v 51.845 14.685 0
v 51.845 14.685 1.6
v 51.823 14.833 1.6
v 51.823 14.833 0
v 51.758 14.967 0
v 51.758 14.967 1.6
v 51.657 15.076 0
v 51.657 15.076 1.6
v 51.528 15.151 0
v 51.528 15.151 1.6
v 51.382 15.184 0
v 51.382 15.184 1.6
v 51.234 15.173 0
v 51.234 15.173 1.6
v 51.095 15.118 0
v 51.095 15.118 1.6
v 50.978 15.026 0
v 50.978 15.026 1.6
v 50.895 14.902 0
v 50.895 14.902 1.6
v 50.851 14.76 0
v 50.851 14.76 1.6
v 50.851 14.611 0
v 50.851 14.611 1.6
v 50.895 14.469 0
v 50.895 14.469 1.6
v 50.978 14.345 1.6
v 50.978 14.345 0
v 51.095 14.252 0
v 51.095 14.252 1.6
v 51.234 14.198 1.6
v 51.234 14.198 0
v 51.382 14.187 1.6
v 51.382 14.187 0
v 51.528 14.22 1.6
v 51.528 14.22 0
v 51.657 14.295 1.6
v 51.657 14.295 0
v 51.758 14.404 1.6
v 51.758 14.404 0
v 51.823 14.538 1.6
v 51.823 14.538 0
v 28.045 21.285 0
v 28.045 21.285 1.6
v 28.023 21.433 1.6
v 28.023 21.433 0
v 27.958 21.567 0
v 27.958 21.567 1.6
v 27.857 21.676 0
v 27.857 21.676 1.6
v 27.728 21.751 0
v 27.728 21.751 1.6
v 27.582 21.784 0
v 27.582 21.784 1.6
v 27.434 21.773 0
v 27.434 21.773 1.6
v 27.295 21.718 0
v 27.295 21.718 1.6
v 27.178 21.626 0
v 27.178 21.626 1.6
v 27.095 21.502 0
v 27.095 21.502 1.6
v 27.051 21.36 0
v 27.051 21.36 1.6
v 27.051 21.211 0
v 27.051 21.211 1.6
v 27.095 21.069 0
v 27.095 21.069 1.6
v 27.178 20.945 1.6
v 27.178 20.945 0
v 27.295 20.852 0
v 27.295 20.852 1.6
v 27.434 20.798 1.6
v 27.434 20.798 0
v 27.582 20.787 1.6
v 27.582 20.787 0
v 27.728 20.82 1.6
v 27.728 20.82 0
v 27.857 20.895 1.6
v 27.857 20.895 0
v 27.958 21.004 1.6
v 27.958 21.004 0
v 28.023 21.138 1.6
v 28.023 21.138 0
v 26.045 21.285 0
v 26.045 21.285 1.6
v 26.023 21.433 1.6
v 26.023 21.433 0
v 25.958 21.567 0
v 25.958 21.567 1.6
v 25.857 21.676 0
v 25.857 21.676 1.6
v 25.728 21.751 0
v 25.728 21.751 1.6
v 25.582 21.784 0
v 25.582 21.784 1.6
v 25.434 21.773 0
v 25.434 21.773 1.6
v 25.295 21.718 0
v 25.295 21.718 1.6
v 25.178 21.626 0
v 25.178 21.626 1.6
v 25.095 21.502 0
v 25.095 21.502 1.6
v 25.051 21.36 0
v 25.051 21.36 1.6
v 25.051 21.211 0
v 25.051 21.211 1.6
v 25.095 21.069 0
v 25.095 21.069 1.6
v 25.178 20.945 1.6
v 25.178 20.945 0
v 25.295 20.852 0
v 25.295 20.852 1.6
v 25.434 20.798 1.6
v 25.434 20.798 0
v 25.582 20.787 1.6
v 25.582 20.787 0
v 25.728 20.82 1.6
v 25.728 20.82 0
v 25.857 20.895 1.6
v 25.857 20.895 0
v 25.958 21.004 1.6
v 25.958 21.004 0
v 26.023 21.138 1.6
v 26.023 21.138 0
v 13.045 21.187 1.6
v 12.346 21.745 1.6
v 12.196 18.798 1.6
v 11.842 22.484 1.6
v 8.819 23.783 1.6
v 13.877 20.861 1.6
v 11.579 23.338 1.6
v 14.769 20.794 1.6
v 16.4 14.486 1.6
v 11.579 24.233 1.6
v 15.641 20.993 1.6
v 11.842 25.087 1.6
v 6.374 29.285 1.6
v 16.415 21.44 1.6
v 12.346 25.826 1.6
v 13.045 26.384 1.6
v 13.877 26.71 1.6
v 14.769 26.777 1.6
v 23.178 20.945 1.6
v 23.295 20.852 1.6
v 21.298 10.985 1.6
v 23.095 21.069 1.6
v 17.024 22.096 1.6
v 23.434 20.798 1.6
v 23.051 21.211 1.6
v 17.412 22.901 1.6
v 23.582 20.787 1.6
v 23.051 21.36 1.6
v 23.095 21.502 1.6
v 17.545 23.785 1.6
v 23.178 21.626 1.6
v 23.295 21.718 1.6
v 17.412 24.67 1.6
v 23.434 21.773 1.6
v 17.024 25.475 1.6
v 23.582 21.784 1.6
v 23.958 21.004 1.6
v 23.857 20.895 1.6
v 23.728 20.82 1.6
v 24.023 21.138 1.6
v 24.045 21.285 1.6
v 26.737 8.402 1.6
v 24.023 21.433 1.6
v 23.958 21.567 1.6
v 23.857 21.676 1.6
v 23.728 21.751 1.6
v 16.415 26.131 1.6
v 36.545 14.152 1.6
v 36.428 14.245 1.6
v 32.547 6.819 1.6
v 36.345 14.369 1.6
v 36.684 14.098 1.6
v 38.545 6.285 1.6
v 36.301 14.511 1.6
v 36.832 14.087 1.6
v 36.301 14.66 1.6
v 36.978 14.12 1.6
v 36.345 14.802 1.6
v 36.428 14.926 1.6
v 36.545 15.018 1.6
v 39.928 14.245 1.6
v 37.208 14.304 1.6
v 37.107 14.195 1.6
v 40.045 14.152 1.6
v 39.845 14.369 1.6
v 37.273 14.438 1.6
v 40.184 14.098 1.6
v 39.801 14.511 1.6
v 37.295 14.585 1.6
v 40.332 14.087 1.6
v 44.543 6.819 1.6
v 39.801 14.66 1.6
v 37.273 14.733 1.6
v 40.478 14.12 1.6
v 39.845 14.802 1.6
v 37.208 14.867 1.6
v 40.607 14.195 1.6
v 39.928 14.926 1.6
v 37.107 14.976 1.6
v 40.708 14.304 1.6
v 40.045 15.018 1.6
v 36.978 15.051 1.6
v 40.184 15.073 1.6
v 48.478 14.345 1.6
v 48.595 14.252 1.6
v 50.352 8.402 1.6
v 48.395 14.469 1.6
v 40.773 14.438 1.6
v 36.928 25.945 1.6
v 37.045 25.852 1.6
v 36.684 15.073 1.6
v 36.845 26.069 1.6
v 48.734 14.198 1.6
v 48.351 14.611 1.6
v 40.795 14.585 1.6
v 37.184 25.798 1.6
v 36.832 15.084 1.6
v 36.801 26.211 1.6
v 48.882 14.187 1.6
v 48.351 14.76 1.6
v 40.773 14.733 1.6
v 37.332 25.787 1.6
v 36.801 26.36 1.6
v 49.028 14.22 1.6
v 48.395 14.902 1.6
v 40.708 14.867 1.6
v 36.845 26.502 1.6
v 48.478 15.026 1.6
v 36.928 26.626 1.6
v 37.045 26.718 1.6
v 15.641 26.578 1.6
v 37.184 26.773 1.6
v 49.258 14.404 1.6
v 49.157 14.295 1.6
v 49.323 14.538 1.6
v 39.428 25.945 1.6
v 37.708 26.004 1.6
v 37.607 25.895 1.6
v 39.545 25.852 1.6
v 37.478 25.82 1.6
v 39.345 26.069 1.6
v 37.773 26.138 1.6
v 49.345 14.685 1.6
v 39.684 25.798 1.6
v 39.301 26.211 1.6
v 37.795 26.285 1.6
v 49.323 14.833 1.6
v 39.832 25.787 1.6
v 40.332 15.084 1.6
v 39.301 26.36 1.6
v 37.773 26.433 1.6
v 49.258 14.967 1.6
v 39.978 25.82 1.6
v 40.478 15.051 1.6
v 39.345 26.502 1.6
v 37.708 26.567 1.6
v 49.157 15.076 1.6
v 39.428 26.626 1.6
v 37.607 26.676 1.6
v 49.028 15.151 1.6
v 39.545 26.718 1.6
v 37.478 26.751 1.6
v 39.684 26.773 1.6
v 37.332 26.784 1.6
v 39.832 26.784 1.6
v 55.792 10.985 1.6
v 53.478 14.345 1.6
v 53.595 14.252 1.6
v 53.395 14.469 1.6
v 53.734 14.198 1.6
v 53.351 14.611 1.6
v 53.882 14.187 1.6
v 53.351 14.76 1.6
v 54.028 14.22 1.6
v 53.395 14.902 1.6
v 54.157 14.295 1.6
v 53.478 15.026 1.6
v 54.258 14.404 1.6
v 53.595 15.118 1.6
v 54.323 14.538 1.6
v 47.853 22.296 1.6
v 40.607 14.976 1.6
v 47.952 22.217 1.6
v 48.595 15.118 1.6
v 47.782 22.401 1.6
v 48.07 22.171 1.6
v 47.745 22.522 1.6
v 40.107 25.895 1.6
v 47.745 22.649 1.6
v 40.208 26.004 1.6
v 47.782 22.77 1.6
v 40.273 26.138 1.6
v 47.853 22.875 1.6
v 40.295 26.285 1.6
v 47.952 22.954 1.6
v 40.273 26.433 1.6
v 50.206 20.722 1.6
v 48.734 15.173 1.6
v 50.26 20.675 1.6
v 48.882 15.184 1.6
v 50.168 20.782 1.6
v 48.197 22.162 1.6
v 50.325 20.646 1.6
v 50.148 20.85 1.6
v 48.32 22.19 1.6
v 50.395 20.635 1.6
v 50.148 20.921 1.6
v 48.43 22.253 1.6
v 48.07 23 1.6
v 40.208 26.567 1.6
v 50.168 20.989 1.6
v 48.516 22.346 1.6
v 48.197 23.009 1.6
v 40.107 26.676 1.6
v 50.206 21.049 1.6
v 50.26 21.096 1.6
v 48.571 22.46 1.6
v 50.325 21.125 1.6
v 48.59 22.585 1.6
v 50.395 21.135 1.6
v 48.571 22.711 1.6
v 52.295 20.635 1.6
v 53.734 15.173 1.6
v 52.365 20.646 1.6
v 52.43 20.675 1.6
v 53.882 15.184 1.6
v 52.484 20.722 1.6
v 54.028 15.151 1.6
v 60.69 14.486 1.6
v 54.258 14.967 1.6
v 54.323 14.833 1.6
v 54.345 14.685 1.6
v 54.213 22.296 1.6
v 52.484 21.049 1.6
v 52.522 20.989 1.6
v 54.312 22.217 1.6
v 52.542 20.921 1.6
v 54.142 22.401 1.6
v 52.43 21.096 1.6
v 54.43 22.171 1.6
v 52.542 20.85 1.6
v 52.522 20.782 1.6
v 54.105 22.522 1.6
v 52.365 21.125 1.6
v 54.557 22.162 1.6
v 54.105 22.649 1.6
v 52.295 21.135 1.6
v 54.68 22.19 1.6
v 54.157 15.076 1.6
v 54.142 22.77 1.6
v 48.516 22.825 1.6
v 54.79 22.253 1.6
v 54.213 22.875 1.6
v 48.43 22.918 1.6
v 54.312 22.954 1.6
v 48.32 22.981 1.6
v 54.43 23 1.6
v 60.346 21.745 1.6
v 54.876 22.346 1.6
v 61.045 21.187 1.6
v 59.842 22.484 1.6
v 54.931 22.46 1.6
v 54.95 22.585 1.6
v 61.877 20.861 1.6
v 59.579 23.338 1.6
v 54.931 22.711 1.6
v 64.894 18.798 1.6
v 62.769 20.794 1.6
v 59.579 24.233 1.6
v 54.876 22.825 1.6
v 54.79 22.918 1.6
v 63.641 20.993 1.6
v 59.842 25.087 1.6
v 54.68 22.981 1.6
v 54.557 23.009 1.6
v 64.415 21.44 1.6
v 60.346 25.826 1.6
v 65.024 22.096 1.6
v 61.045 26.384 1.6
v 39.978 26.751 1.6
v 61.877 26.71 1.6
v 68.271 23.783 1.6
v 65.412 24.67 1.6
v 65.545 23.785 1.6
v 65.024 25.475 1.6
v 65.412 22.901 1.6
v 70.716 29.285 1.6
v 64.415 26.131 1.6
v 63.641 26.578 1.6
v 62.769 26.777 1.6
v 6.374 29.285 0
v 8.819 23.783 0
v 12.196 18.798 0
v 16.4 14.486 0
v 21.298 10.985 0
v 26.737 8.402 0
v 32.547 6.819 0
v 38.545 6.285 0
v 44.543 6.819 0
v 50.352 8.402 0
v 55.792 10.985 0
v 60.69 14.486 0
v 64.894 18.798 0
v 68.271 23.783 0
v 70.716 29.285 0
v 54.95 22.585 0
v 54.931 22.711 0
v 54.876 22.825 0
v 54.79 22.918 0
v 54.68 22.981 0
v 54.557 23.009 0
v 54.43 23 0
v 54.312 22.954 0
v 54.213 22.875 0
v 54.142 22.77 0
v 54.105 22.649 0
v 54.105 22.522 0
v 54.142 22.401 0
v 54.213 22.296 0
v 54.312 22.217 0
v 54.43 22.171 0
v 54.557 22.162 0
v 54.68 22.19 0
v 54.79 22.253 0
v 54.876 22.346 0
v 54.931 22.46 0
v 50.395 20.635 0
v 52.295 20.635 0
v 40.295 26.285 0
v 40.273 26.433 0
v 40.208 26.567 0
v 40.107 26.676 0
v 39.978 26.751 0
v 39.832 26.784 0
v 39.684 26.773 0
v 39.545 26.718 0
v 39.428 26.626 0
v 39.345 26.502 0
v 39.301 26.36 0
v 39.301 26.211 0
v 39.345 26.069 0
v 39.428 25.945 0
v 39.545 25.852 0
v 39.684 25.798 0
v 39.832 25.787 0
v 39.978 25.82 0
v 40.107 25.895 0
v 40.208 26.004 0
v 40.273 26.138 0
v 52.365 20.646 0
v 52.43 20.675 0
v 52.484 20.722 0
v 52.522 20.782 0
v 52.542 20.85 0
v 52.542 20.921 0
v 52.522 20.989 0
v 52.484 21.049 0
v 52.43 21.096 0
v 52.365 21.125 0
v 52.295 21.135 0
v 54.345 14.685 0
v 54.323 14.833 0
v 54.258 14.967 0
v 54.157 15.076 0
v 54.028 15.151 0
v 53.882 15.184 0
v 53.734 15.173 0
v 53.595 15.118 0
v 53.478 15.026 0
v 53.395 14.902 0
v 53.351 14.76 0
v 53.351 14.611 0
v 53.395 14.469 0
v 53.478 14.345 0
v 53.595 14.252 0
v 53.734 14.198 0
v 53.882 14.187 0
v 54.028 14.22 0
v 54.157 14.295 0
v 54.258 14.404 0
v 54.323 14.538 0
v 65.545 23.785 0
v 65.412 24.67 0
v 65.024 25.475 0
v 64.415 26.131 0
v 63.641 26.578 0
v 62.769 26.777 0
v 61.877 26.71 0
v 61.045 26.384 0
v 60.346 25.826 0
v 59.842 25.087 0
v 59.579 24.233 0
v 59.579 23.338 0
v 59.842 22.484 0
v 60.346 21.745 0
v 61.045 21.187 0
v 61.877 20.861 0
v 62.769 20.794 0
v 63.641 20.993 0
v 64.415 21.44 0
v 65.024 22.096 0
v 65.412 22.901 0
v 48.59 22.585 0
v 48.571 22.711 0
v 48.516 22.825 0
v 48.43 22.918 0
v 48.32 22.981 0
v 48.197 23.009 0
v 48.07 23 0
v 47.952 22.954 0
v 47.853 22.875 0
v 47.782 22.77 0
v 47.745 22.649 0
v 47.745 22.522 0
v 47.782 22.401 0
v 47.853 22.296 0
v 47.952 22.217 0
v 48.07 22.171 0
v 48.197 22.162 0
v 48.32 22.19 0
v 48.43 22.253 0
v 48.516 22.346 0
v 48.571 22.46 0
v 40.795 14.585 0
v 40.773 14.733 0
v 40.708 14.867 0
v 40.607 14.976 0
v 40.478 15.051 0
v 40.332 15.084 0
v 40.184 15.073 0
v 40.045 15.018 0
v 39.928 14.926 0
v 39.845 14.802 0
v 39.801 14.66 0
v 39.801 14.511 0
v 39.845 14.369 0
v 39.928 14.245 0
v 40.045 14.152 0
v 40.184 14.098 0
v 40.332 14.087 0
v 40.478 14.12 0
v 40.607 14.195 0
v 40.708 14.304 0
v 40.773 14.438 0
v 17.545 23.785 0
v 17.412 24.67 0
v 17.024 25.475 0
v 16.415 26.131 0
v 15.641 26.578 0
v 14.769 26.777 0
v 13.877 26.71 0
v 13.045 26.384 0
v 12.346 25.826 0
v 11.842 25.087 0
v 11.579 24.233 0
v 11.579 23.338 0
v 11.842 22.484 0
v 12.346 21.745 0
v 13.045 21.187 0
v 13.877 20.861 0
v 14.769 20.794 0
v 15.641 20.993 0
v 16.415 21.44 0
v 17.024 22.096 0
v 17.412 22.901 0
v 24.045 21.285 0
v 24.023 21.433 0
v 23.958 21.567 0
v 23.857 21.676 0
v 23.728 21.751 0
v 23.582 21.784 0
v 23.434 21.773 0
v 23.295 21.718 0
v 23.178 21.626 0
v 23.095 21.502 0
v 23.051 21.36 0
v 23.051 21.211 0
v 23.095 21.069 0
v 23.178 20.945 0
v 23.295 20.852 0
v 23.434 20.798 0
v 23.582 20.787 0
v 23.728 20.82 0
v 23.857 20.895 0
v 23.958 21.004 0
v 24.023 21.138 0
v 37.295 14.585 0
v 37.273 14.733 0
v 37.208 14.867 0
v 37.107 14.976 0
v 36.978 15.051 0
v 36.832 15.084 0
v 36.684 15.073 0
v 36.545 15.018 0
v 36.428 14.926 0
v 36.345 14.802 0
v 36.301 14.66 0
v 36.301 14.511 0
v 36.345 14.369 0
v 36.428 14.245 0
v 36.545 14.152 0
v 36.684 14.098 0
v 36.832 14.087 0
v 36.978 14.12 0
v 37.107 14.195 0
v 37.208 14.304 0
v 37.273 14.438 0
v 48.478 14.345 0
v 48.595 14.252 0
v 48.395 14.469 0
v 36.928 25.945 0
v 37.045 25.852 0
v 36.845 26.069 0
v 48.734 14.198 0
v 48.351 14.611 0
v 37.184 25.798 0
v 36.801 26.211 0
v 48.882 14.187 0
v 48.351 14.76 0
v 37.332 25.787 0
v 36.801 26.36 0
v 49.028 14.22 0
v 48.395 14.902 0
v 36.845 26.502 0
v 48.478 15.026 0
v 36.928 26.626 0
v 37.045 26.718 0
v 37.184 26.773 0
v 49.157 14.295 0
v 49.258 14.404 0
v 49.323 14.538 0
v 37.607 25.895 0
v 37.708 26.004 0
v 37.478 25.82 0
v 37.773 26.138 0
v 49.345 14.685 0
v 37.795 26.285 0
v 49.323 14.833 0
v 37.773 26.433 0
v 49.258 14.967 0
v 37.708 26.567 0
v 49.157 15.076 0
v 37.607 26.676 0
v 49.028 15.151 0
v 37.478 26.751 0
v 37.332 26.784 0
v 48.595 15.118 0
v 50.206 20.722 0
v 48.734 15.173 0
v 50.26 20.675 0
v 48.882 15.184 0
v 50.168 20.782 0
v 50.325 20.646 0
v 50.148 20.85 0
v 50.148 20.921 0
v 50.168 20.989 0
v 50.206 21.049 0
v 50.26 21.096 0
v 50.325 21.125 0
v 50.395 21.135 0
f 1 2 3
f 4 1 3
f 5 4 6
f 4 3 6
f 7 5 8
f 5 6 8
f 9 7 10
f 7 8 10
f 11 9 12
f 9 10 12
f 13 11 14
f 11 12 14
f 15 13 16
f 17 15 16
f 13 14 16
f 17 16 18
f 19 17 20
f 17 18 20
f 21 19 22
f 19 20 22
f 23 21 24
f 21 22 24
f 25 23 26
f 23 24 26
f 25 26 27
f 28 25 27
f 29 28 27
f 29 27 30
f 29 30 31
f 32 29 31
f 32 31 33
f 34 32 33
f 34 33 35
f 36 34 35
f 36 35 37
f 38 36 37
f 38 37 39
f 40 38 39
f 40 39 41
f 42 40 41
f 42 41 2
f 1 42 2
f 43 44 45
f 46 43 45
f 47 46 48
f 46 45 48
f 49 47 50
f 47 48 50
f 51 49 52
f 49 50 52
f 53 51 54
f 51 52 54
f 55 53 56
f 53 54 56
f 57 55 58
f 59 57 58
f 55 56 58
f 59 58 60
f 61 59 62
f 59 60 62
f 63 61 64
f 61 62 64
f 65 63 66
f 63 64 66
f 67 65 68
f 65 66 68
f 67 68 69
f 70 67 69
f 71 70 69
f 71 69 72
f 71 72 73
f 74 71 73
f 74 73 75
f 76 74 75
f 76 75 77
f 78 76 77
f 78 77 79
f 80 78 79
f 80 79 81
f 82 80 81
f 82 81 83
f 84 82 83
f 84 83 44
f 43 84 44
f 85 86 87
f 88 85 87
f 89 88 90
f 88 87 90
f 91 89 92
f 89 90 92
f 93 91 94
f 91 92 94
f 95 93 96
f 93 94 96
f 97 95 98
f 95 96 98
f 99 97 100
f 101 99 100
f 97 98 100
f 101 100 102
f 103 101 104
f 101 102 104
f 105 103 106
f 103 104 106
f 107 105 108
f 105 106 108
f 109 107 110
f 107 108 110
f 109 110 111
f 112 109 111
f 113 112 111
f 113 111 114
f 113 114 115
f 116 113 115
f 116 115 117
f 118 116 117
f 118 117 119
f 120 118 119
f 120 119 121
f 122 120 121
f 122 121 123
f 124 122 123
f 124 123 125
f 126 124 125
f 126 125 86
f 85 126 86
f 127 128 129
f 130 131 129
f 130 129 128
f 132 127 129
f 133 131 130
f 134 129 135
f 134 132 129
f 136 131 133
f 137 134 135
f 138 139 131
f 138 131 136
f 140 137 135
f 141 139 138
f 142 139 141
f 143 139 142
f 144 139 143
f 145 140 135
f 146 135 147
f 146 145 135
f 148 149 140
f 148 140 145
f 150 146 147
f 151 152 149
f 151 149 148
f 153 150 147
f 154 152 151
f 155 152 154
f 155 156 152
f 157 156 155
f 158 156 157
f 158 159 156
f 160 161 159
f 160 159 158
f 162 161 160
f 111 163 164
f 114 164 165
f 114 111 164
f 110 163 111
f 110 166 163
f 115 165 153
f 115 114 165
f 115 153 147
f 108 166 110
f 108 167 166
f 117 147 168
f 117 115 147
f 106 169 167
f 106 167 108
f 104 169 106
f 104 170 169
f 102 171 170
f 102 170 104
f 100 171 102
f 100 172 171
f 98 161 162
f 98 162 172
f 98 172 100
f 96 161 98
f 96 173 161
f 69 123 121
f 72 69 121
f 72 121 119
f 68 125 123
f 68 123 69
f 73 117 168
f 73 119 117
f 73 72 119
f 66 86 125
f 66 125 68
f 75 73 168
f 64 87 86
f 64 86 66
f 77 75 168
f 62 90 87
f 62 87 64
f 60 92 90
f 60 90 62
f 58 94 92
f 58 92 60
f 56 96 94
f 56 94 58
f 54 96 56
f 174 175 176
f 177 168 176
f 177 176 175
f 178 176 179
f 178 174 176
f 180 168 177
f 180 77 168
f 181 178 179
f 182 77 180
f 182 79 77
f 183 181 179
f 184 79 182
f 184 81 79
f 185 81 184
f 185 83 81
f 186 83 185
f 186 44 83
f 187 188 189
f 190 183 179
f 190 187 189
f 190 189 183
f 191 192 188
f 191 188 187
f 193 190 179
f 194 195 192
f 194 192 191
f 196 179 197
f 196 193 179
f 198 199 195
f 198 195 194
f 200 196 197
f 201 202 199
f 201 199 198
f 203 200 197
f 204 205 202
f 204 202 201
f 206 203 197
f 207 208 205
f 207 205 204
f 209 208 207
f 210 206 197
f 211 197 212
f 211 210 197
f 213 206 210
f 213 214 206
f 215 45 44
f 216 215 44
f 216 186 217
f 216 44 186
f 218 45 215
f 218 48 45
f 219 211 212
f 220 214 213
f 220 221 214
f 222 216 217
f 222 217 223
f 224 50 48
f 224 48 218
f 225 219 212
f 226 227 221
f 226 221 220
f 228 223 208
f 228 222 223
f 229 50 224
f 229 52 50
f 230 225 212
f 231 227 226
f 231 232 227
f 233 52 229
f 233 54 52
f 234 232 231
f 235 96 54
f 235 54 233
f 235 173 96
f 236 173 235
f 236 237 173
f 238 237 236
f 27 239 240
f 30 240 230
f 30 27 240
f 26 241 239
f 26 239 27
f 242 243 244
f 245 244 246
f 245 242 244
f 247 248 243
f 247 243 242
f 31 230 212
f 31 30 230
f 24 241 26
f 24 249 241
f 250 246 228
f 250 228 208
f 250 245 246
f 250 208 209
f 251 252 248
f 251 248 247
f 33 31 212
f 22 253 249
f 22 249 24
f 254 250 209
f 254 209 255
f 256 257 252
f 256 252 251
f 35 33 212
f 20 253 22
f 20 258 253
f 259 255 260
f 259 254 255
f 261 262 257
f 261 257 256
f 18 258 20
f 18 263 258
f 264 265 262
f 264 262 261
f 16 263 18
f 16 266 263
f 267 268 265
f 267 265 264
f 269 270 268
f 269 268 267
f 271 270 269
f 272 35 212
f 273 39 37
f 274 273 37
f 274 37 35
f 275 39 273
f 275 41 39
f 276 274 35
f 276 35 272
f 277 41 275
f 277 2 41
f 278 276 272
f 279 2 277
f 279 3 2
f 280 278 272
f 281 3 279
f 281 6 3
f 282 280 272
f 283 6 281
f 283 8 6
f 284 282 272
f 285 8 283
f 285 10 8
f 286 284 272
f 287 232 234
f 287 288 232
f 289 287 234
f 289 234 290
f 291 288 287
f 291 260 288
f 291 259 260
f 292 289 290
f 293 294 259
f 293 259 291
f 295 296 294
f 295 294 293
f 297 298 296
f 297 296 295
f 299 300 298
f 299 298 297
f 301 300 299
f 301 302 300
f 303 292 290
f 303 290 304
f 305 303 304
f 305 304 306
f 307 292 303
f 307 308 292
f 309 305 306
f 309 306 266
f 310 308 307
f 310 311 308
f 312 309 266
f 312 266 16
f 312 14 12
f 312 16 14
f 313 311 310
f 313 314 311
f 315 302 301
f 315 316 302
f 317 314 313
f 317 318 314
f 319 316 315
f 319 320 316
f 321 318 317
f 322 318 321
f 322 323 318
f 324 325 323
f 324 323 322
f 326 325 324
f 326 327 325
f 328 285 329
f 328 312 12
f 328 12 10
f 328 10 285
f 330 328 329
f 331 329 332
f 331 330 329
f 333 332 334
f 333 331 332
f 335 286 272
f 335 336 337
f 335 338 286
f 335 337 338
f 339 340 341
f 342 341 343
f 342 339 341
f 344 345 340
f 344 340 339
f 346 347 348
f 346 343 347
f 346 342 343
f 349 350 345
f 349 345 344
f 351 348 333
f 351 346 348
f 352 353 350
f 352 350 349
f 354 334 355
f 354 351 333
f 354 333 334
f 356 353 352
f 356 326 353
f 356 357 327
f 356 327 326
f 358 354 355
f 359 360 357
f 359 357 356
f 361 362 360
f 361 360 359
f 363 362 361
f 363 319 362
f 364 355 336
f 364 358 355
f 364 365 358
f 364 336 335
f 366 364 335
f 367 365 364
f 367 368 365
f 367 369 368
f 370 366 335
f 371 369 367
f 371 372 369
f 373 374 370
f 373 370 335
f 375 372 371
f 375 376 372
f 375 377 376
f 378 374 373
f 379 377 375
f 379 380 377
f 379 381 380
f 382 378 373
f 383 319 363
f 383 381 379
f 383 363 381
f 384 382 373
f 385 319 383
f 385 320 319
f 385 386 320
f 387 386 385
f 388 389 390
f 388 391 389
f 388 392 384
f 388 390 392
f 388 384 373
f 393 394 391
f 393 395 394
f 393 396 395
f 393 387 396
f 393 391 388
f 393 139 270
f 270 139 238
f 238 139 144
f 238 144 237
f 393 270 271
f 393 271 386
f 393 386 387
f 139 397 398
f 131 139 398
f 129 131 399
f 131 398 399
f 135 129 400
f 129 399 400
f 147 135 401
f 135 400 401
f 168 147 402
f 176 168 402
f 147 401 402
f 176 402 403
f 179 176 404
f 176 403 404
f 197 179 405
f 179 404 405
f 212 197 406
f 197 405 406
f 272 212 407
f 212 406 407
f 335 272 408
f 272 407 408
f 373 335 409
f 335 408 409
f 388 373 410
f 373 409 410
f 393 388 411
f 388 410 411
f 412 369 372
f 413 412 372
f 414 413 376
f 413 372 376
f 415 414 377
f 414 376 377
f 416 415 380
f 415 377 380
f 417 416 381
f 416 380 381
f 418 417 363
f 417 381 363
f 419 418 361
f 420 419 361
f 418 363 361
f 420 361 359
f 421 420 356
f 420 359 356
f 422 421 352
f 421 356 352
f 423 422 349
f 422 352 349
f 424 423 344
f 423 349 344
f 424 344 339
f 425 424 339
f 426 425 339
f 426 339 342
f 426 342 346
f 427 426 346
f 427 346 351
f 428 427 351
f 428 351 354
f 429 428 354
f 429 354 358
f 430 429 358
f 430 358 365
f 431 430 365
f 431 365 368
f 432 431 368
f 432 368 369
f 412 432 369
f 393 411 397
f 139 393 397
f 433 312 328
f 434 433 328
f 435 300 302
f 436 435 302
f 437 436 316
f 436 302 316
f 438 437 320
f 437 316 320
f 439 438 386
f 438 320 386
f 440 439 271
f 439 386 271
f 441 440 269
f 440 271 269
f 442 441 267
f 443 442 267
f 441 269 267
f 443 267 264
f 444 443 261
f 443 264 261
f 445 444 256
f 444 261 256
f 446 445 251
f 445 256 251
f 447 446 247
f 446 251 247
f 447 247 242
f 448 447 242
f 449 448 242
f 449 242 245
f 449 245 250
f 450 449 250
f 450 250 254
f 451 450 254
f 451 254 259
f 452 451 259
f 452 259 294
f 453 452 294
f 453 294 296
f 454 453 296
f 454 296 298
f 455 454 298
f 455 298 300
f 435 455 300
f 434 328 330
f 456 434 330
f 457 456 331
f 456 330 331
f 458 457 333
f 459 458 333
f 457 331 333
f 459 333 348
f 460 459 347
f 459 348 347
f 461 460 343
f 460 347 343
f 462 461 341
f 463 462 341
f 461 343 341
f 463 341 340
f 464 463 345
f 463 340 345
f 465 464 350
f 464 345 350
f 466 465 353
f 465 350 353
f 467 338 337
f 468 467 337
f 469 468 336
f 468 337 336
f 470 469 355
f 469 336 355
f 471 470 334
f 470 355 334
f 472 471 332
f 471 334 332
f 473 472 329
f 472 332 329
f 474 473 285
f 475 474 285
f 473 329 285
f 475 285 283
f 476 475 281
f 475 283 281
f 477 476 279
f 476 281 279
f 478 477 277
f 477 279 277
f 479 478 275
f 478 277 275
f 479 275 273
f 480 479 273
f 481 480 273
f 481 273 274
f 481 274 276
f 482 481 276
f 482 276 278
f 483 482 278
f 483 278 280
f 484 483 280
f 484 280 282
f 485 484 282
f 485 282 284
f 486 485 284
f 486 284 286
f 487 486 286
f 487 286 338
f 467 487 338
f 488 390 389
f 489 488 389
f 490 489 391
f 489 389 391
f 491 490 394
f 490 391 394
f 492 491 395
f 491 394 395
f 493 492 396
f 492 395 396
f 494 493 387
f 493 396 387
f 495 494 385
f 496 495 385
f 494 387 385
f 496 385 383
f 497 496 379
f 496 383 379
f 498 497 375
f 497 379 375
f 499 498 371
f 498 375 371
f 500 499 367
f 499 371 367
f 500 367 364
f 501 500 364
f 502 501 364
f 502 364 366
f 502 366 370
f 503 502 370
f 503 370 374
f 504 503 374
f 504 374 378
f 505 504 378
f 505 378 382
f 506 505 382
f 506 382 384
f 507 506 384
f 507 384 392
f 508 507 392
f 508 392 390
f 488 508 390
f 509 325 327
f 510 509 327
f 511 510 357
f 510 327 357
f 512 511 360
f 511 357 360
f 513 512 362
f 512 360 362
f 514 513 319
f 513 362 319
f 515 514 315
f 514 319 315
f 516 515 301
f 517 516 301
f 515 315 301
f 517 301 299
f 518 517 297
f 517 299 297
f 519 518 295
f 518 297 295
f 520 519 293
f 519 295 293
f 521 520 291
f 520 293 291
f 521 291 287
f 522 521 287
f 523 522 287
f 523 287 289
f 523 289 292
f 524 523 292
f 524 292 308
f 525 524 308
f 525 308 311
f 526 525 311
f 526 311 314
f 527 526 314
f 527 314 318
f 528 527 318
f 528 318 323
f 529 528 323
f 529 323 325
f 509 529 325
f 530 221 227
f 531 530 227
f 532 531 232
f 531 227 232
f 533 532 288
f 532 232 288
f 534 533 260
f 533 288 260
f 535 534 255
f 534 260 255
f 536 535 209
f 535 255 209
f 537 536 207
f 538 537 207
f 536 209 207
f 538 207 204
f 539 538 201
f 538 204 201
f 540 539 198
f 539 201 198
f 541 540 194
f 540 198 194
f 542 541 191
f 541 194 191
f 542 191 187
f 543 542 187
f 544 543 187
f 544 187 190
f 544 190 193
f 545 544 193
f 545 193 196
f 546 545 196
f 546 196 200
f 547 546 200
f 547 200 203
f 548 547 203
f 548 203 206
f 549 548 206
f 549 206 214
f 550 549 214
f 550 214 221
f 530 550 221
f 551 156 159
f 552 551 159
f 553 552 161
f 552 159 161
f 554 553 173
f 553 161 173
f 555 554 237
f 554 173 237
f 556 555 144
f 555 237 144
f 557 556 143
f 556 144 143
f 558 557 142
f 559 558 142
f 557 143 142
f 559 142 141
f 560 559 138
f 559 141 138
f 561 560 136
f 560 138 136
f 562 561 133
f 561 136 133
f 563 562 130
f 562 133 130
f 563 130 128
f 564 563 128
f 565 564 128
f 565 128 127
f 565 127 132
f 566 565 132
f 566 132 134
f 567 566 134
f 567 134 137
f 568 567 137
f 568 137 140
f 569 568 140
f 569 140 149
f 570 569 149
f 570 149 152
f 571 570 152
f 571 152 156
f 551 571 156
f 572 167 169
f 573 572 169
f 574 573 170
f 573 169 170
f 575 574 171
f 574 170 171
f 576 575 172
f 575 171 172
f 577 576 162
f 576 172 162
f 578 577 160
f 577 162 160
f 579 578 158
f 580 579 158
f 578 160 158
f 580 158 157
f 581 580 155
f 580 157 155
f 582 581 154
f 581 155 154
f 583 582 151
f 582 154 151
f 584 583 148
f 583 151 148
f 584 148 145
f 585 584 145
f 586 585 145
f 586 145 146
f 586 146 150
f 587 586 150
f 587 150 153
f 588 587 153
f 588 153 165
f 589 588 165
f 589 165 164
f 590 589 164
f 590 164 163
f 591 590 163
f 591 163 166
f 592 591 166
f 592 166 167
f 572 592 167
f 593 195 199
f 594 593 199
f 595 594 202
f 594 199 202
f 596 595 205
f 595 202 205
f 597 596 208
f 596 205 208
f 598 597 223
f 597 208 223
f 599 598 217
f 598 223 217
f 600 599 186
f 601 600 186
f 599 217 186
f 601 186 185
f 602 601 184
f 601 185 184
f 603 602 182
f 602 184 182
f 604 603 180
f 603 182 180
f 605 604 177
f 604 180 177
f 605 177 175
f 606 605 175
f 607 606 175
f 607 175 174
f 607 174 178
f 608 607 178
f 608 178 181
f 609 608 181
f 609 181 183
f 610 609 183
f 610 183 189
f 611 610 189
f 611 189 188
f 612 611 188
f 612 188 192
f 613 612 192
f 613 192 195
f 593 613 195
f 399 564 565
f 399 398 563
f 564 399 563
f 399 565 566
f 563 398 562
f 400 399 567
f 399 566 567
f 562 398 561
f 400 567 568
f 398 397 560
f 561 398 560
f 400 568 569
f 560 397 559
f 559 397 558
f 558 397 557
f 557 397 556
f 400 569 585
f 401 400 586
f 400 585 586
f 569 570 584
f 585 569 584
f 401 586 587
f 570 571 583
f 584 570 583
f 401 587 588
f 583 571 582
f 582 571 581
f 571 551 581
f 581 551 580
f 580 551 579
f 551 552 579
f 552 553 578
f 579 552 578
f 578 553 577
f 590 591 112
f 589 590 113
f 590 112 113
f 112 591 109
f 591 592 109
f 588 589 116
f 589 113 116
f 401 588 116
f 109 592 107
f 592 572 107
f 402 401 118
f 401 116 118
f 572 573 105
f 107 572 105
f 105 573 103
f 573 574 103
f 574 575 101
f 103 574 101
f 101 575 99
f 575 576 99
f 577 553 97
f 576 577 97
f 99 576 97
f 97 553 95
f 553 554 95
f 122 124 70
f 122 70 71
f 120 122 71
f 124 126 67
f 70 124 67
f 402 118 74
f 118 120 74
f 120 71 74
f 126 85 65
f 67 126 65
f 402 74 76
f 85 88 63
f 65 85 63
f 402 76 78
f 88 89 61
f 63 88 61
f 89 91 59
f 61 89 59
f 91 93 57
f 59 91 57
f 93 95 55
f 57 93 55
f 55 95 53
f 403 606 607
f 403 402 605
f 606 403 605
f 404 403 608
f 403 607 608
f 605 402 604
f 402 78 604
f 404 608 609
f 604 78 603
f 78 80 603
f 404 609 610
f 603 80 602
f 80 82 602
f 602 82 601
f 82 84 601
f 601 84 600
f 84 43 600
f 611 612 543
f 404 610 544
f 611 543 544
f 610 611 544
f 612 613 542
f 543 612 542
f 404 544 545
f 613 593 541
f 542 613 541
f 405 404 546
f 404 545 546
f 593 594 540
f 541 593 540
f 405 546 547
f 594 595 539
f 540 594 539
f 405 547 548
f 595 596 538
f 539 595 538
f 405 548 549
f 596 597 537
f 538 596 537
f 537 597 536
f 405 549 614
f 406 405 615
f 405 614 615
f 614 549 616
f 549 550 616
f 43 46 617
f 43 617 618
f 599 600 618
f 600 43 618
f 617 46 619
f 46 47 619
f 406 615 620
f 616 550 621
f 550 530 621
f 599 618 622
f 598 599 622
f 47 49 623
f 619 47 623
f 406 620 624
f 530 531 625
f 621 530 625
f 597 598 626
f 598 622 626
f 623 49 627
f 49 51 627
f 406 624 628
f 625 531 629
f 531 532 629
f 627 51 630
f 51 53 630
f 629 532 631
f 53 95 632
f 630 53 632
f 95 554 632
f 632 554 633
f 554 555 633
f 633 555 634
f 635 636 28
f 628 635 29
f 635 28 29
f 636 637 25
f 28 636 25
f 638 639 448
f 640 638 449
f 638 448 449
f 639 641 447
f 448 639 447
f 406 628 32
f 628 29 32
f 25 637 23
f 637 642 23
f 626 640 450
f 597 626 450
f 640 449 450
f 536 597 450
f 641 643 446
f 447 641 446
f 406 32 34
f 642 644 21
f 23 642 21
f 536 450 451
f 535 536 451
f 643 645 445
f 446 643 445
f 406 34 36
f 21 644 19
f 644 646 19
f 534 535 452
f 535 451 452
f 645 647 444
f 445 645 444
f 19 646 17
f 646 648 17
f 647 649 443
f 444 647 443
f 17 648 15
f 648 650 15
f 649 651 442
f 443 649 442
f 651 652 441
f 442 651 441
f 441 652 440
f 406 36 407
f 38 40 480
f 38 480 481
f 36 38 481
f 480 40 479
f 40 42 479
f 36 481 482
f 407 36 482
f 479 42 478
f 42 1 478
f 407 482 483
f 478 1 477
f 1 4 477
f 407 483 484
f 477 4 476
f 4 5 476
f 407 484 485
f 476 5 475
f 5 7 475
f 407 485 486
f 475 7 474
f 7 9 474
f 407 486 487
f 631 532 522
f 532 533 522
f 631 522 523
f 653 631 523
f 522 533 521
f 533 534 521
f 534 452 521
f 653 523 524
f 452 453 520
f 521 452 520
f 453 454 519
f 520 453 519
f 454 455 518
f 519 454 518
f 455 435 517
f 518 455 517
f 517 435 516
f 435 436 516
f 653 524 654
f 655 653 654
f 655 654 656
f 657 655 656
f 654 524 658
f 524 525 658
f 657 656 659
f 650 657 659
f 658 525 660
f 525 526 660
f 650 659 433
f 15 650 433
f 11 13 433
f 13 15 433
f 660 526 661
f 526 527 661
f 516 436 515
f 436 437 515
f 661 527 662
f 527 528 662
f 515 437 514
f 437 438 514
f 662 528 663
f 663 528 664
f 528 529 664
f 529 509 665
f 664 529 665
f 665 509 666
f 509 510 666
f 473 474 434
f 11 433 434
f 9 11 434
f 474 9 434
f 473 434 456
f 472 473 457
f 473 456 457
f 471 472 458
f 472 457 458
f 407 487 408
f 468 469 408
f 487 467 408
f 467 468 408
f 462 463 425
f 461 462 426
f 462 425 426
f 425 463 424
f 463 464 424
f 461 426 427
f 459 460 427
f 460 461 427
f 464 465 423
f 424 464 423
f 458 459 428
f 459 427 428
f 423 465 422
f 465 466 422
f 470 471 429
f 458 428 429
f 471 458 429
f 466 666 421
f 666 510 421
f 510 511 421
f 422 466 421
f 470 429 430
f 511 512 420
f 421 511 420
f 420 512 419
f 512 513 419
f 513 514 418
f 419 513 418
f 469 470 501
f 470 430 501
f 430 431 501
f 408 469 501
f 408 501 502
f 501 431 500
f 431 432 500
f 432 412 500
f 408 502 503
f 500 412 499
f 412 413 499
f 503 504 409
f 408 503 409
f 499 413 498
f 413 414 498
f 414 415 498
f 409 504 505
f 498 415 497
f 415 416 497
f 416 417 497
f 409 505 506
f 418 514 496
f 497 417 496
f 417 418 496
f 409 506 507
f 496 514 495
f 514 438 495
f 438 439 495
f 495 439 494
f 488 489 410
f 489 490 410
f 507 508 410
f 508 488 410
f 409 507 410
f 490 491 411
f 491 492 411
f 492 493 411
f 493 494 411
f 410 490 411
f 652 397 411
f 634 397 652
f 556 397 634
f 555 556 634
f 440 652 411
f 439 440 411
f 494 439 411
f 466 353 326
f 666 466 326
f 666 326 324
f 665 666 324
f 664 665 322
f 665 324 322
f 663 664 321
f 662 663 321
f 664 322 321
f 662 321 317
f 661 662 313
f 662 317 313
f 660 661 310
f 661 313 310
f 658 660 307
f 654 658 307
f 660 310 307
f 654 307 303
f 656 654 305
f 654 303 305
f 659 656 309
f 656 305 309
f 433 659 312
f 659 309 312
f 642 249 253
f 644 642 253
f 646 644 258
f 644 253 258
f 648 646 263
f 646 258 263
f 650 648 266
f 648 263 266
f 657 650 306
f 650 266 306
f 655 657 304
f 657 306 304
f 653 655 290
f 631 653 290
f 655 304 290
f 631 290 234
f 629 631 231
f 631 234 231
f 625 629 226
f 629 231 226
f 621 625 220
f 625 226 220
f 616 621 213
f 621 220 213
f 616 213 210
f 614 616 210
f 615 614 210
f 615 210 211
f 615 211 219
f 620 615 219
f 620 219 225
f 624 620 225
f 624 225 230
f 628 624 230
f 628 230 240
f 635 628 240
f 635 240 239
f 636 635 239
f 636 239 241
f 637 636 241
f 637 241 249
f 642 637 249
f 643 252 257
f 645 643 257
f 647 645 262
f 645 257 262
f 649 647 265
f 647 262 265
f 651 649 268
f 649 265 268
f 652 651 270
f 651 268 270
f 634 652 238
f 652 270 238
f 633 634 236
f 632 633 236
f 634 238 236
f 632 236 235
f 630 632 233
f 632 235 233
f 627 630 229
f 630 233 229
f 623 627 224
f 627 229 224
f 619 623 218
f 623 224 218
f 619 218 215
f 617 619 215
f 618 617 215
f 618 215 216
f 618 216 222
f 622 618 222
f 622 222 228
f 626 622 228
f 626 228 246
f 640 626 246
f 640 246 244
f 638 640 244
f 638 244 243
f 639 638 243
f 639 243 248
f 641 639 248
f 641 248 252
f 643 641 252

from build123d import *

# Parameters (mm, degrees)
F1_DEPTH  = 1.6
F2_R      = 3
F3_DEPTH  = 3
F6_R      = 0.5
F7_R      = 0.5
F8_R      = 0.5
F5_R      = 0.425
F4_R      = 0.5
F9_DEPTH  = 4
F10_R     = 2.1
F11_DEPTH = 0.2


with BuildPart() as f1:
    # F0 (on Top) → F1 (new body)
    with BuildSketch(Plane.XY):
        with BuildLine():
            Line((70.716411, 29.285482), (6.37358, 29.285482))
            ThreePointArc((6.37358, 29.285482), (38.544995, 6.285482), (70.716411, 29.285482))
        make_face()
    extrude(amount=F1_DEPTH)

    # F2 (on face) → F3 (cut)
    with BuildSketch(Plane.XY.offset(1.6)):
        with Locations((14.544995, 23.785482)):
            Circle(F2_R)
        with Locations((62.544995, 23.785482)):
            Circle(F2_R)
    extrude(amount=-F3_DEPTH, mode=Mode.SUBTRACT)

    # F6 (on face) + F7 (on face) + F8 (on face) + F5 (on face) + F4 (on face) → F9 (cut)
    with BuildSketch(Plane.XY.offset(1.6)):
        with Locations((48.844995, 14.685482)):
            Circle(F6_R)
        with Locations((53.844995, 14.685482)):
            Circle(F6_R)
        with Locations((51.344995, 14.685482)):
            Circle(F6_R)
    with BuildSketch(Plane.XY.offset(1.6)):
        with Locations((37.294995, 26.285482)):
            Circle(F7_R)
        with Locations((39.794995, 26.285482)):
            Circle(F7_R)
    with BuildSketch(Plane.XY.offset(1.6)):
        with Locations((36.794995, 14.585482)):
            Circle(F8_R)
        with Locations((40.294995, 14.585482)):
            Circle(F8_R)
    with BuildSketch(Plane.XY.offset(1.6)):
        with BuildLine():
            ThreePointArc((50.394995, 21.135482), (50.144995, 20.885482), (50.394995, 20.635482))
            Line((50.394995, 20.635482), (52.294995, 20.635482))
            ThreePointArc((52.294995, 20.635482), (52.544995, 20.885482), (52.294995, 21.135482))
            Line((52.294995, 21.135482), (50.394995, 21.135482))
        make_face()
        with Locations((48.164995, 22.585482)):
            Circle(F5_R)
        with Locations((54.524995, 22.585482)):
            Circle(F5_R)
    with BuildSketch(Plane.XY.offset(1.6)):
        with Locations((23.544995, 21.285482)):
            Circle(F4_R)
        with Locations((25.544995, 21.285482)):
            Circle(F4_R)
        with Locations((27.544995, 21.285482)):
            Circle(F4_R)
    extrude(amount=-F9_DEPTH, mode=Mode.SUBTRACT)

    # F10 (on face) → F11 (cut)
    with BuildSketch(Plane(origin=(0, 0, 0), x_dir=(1, 0, 0), z_dir=(0, 0, -1))):
        with Locations((62.544995, -23.785482)):
            Circle(F10_R)
        with Locations((14.544995, -23.785482)):
            Circle(F10_R)
    extrude(amount=-F11_DEPTH, mode=Mode.SUBTRACT)


solid = f1.part
